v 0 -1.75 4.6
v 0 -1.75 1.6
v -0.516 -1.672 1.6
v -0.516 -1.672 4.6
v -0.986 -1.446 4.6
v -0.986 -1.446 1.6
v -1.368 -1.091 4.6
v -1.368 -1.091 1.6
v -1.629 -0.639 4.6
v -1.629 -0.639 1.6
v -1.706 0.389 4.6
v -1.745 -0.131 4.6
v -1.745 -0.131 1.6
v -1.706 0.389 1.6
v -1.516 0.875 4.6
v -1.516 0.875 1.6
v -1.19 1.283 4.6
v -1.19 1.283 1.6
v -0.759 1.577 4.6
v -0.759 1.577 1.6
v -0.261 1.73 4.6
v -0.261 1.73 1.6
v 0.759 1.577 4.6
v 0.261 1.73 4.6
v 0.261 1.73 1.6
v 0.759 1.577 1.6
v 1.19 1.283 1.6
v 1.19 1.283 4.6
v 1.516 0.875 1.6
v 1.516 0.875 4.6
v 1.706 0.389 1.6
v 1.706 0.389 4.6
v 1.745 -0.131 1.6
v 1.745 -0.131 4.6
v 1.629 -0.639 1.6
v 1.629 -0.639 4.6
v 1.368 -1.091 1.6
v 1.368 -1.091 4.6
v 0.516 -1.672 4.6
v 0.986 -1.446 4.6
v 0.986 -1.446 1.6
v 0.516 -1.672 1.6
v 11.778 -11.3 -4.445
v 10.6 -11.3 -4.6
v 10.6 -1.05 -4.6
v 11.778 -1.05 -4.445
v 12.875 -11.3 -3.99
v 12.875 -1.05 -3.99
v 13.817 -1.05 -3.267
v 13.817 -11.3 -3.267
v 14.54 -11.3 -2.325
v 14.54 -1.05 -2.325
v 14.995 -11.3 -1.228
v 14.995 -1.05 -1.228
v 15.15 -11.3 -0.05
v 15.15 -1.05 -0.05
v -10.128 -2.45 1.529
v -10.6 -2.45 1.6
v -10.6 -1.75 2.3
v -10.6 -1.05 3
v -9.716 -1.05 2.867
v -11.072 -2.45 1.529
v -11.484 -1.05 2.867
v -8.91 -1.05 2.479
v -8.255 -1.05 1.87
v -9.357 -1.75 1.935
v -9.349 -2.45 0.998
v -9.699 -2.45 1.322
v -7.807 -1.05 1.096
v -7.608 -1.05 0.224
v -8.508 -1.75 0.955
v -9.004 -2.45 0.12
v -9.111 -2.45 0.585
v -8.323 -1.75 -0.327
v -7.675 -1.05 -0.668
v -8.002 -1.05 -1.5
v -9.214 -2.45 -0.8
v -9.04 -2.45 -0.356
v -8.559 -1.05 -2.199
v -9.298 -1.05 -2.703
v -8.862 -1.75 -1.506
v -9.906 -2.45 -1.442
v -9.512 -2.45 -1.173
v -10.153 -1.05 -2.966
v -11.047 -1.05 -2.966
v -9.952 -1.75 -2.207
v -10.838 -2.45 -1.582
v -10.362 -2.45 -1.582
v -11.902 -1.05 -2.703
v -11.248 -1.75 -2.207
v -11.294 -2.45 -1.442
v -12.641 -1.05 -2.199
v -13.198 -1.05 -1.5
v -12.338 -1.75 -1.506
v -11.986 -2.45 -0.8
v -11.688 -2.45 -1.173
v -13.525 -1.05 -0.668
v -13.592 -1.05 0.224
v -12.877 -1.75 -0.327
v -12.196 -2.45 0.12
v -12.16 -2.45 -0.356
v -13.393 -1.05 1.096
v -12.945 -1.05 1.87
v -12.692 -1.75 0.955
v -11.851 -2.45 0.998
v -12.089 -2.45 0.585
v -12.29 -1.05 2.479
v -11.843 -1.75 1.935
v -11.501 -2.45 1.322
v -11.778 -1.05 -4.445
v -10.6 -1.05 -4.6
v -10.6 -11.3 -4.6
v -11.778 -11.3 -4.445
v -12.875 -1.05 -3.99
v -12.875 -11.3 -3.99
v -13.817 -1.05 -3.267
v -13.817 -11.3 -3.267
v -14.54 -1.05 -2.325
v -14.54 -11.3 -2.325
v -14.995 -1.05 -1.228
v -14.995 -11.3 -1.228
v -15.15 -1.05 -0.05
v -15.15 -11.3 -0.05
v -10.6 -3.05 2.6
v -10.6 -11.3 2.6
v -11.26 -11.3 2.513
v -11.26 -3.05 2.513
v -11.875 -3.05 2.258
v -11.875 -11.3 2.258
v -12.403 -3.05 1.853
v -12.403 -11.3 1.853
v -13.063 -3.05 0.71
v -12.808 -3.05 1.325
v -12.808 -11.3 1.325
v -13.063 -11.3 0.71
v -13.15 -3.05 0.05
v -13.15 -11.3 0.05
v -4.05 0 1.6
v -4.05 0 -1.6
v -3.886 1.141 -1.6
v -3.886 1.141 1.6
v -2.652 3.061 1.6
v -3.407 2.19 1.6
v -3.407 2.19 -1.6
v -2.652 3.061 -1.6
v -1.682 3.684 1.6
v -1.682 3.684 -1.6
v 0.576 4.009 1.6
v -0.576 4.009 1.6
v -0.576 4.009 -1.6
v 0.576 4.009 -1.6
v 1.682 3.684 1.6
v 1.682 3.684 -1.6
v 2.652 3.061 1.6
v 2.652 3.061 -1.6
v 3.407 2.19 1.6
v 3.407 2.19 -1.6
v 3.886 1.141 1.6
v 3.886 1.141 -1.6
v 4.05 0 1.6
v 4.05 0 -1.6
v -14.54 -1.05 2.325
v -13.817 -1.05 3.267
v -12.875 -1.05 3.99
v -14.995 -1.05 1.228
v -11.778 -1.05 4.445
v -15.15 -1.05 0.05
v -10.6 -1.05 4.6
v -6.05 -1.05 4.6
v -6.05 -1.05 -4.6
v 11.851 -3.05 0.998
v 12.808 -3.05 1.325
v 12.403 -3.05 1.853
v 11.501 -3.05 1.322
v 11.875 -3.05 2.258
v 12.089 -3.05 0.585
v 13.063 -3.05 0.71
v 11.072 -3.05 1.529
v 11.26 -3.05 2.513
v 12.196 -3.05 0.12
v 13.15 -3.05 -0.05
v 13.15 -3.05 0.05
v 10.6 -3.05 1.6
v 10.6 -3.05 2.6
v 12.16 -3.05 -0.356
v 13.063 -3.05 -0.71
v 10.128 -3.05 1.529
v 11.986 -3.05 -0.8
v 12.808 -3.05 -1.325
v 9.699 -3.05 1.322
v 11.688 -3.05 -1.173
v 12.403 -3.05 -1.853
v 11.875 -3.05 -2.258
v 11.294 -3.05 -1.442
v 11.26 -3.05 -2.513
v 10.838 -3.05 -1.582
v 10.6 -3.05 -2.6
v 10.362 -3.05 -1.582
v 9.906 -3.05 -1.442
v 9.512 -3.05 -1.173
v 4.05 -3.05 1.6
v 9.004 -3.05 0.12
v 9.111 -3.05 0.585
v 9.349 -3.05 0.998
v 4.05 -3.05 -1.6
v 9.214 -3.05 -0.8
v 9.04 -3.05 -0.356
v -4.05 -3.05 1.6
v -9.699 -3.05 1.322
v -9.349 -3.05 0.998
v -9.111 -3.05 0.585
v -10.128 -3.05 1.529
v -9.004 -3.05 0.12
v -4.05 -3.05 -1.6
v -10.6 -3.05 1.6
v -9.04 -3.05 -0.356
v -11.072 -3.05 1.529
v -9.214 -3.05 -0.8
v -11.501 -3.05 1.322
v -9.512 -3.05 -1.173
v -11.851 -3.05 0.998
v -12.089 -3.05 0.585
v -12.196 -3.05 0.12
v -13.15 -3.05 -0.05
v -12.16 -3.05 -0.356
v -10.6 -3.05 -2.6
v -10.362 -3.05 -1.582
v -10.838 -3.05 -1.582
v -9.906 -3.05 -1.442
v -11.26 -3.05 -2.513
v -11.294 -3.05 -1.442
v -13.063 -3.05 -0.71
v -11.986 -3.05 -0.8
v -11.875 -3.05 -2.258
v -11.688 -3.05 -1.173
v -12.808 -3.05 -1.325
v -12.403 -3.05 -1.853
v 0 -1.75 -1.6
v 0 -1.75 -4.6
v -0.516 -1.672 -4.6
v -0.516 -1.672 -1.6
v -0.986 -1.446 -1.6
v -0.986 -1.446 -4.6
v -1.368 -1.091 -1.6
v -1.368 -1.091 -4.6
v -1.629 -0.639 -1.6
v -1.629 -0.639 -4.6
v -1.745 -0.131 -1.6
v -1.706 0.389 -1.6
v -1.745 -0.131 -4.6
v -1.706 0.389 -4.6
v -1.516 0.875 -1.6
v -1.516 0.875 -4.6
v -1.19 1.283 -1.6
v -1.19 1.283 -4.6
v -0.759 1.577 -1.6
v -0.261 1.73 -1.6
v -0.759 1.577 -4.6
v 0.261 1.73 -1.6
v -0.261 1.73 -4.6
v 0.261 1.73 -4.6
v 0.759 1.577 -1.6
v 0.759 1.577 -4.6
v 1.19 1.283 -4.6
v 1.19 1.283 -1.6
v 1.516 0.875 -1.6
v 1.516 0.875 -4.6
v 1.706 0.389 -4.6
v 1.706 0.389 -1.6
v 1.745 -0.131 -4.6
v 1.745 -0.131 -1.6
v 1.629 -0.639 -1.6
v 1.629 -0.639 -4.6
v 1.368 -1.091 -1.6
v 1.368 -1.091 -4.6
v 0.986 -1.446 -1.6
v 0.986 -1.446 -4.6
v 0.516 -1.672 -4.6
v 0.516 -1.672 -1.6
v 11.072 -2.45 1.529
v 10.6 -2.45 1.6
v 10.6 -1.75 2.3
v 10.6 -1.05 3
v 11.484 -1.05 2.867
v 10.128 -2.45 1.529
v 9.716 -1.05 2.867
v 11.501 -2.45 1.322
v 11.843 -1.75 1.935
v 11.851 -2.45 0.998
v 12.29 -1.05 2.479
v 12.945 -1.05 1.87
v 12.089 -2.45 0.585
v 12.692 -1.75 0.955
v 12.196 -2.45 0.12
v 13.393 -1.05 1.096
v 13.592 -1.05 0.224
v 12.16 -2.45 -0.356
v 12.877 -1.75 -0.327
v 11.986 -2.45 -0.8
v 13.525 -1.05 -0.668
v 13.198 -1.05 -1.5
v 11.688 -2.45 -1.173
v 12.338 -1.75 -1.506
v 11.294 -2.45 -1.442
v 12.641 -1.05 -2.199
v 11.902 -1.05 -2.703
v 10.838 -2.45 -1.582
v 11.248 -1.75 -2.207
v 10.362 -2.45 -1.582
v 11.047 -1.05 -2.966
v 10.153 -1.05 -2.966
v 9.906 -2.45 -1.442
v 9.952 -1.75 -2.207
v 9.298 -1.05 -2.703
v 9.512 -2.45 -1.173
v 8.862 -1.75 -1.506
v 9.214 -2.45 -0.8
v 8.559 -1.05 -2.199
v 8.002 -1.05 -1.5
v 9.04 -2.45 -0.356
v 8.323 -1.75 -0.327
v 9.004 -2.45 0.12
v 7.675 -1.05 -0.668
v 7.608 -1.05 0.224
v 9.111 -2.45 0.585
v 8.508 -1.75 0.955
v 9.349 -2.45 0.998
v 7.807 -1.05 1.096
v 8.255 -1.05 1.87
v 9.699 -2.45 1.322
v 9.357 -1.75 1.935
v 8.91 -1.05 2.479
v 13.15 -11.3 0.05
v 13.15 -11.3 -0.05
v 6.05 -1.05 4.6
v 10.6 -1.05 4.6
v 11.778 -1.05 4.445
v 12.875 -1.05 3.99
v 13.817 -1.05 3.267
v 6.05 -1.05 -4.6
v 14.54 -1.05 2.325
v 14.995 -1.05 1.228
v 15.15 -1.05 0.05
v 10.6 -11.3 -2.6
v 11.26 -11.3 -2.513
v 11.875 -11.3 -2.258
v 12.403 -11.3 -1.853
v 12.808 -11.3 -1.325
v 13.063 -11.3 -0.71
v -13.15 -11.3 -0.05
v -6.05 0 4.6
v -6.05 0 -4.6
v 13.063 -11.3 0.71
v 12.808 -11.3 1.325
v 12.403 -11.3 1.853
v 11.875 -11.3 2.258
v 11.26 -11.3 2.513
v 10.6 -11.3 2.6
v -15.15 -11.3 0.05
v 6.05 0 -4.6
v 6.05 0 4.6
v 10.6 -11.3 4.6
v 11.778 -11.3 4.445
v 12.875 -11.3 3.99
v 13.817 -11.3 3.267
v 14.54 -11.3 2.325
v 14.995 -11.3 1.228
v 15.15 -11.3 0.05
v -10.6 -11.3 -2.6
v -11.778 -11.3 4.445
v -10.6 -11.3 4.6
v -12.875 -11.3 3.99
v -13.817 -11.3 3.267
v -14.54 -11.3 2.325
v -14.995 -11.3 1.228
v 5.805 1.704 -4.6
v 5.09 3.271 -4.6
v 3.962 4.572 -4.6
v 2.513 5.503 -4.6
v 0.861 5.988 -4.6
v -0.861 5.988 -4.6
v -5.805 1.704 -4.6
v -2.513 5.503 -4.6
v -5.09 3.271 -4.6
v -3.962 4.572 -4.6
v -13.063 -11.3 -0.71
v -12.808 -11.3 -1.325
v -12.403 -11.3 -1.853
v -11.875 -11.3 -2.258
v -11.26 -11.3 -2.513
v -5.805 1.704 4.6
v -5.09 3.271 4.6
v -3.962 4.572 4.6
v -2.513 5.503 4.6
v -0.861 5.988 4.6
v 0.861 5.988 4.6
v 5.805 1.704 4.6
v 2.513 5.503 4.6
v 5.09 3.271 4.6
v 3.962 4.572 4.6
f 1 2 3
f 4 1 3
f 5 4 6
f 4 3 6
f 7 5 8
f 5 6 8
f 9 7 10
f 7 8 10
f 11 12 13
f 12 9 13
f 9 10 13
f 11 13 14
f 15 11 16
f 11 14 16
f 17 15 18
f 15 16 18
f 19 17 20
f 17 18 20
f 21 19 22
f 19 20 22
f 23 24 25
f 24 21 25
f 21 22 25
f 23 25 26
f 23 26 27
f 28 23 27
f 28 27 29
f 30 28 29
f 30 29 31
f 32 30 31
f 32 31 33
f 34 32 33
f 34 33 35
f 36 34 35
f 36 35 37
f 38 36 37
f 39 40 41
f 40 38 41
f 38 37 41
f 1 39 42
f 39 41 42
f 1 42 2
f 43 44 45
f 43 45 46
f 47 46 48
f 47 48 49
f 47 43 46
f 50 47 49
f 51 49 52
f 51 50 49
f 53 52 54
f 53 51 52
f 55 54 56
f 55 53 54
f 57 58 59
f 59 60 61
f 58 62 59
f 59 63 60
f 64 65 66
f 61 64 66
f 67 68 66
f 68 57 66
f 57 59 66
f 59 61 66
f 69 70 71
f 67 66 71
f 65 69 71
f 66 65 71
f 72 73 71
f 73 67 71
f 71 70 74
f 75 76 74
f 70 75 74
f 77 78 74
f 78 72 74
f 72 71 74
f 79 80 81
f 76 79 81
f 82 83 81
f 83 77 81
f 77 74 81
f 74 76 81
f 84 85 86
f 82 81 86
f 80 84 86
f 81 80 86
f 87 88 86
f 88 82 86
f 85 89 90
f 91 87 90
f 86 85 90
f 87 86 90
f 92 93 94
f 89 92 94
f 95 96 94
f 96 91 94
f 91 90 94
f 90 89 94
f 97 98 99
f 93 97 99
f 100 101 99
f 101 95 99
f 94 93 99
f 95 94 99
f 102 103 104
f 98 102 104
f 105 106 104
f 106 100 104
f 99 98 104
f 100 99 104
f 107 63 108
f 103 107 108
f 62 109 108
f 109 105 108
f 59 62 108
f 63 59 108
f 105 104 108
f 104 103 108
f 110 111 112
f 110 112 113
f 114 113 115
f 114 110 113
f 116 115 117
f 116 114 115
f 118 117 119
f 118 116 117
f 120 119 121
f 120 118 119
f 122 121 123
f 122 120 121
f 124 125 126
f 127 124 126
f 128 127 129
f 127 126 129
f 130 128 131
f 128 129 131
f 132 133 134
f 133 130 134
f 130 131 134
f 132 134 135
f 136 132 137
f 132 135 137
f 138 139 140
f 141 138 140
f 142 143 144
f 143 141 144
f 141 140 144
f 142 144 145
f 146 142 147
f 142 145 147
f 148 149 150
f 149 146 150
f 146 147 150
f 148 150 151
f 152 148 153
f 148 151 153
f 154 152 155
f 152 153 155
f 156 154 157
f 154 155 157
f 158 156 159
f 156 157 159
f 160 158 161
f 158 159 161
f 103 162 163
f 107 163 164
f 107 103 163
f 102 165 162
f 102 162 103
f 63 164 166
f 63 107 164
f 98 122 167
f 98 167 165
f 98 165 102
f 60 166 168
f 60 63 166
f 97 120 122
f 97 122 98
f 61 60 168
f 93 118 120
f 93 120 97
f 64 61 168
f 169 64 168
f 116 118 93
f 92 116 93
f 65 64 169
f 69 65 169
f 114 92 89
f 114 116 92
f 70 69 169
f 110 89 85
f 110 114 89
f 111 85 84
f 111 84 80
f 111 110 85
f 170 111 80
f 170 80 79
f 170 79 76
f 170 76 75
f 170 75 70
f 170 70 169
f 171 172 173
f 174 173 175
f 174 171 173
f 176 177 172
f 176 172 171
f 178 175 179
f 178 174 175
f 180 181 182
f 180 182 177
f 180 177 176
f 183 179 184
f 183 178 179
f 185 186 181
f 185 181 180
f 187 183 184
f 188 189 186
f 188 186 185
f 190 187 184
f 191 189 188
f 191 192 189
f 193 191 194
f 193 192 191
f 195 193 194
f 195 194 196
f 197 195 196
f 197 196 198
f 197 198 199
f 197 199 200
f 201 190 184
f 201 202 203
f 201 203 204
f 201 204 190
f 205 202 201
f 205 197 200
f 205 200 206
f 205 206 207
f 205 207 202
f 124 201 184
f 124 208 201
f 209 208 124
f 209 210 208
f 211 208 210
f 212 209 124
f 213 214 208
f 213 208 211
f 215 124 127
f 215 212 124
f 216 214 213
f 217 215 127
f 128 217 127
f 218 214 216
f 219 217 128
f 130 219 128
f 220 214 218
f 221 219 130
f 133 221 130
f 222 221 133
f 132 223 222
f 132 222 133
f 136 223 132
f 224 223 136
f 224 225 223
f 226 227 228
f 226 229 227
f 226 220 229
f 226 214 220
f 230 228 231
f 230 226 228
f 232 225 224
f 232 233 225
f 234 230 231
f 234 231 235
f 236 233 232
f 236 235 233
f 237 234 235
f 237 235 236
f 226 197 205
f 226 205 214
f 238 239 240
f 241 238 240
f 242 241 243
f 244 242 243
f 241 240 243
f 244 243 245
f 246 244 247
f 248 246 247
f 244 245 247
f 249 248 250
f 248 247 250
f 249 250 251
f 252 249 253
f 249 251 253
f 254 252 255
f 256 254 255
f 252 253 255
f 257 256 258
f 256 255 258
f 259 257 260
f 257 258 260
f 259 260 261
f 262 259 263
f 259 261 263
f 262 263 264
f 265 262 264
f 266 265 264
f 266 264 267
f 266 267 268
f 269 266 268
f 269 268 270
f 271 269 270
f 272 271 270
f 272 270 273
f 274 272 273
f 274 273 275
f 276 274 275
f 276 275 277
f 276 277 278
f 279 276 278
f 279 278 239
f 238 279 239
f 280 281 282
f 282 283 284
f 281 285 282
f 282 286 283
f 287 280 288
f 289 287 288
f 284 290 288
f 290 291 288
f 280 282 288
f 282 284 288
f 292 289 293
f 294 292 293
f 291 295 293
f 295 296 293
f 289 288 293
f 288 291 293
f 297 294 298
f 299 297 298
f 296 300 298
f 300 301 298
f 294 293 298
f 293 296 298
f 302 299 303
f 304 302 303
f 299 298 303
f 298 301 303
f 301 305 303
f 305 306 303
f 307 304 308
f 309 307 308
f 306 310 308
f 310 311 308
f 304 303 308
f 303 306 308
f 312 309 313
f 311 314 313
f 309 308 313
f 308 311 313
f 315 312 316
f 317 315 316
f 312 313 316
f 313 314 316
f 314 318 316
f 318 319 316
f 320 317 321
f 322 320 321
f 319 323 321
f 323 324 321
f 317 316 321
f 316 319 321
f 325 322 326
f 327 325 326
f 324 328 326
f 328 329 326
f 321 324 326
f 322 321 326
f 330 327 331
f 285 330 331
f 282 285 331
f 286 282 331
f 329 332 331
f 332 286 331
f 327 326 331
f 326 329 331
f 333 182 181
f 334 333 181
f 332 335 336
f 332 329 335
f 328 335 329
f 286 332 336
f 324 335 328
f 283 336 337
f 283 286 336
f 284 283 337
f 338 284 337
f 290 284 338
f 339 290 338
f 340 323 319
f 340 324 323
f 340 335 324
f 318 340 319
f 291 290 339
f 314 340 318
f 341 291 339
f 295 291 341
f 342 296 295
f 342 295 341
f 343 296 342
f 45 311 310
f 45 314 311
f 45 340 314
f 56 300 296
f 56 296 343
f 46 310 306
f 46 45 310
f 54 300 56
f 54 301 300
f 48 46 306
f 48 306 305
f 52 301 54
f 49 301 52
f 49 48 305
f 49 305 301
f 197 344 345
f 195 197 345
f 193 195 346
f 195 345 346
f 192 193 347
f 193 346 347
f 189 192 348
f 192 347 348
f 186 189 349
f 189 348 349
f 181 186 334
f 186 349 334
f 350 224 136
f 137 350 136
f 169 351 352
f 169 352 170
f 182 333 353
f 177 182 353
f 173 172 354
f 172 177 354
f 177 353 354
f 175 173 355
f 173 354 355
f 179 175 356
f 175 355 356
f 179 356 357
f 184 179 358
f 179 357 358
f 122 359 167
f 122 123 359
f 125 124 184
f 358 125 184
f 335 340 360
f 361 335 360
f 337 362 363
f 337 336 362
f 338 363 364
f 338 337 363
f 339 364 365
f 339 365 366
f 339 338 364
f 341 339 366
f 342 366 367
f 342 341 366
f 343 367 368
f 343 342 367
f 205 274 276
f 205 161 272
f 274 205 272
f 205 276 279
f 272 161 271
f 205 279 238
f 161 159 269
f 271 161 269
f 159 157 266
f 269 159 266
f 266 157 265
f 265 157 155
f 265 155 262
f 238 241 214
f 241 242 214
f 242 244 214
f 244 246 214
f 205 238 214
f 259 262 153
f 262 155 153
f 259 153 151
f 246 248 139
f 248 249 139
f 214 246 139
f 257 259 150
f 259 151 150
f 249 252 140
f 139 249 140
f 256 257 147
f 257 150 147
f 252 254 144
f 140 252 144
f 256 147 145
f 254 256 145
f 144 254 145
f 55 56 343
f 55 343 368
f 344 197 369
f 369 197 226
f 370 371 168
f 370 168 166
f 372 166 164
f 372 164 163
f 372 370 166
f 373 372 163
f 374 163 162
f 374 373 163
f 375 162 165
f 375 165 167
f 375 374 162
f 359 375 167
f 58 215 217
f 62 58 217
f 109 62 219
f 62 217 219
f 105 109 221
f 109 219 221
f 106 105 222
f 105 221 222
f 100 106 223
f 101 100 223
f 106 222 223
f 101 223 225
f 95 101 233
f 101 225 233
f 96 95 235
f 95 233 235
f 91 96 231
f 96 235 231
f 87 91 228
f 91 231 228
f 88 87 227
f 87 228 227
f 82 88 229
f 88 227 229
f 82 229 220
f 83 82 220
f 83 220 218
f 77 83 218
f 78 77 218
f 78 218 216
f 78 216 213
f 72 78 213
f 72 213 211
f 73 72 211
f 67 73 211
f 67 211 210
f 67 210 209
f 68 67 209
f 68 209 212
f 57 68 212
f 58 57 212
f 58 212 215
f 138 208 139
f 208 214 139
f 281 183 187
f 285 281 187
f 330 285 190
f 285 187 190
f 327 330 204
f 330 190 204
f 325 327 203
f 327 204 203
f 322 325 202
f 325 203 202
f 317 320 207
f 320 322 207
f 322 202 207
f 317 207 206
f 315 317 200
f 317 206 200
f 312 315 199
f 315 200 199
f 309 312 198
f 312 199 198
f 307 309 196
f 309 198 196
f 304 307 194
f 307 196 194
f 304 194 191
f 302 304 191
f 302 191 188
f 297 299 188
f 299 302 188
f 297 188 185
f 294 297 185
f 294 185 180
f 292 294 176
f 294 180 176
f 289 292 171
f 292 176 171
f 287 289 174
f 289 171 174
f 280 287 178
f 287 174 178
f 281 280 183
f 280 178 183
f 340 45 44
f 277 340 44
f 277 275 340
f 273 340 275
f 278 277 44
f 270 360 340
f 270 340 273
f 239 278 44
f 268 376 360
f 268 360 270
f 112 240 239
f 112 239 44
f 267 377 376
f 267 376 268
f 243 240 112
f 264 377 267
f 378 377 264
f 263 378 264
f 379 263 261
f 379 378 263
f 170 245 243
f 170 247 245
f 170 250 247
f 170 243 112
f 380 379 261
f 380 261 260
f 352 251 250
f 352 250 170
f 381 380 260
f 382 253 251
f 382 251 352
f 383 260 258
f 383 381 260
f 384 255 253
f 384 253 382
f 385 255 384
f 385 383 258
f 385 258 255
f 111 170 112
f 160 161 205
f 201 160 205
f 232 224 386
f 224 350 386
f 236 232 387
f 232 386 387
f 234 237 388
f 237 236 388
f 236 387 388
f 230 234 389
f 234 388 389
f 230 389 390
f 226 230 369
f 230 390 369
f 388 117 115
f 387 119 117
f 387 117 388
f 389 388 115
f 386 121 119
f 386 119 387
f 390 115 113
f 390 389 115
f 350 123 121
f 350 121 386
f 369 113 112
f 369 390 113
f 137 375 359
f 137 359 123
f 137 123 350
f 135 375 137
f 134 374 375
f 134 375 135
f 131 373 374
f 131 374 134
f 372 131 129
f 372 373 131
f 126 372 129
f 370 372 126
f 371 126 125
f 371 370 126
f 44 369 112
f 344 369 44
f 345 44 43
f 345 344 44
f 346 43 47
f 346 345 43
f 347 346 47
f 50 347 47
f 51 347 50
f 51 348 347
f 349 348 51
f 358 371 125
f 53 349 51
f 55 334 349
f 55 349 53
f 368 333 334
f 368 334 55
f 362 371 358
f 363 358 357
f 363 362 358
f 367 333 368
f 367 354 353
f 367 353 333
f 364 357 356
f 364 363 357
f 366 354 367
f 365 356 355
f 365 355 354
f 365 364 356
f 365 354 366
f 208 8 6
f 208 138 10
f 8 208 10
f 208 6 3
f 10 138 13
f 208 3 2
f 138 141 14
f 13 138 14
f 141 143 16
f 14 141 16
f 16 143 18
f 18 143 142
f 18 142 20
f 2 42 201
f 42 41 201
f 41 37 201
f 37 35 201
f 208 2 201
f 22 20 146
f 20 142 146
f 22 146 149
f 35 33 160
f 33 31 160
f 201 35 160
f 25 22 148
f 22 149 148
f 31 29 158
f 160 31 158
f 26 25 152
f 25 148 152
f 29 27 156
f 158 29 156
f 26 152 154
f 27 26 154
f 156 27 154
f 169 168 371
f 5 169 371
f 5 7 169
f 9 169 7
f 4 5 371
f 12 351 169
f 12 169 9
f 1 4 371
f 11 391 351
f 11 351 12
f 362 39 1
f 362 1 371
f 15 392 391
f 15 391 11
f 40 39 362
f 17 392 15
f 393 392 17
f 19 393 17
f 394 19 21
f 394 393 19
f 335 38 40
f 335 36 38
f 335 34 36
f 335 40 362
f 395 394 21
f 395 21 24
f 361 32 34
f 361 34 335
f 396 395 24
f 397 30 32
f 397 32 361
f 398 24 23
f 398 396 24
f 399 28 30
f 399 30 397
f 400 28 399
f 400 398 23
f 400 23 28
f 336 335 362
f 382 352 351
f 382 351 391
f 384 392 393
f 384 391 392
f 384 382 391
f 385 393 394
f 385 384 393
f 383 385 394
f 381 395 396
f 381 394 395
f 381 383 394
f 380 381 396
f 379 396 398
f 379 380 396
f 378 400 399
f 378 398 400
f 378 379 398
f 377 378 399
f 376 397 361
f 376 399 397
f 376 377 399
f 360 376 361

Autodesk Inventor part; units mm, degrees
ref_plane "YZ Plane" through (0, 0, 0) normal (1, 0, 0) x (0, 1, 0)
ref_plane "XZ Plane" through (0, 0, 0) normal (0, 1, 0) x (-1, 0, 0)
ref_plane "XY Plane" through (0, 0, 0) normal (0, 0, 1) x (1, 0, 0)
sketch "Эскиз1" plane through (0, 0, 0) normal (0, 0, 1) x (1, 0, 0)
  circle A0 centre (0, 0) radius 4.05
  line L0 (-6.05, -6.05) -> (6.05, -6.05)
  line L1 (6.05, -6.05) -> (6.05, 6.05)
  line L2 (6.05, 6.05) -> (-6.05, 6.05)
  line L3 (-6.05, 6.05) -> (-6.05, -6.05)
  line L4 (-6.05, -6.05) -> (6.05, 6.05) construction
  line L5 (6.05, -6.05) -> (-6.05, 6.05) construction
  line L6 (0, 4.05) -> (0, 6.05)
  line L7 (-4.05, 0) -> (-6.05, 0)
  line L8 (-15.15, -1.05) -> (0, -1.05)
  line L9 (0, -1.05) -> (0, -3.05)
  line L10 (0, -3.05) -> (-15.15, -3.05)
  line L11 (-15.15, -3.05) -> (-15.15, -1.05)
  line L12 (-4.05, 0) -> (4.05, 0)
  line L13 (4.05, 0) -> (4.05, -3.05)
  line L14 (4.05, -3.05) -> (-4.05, -3.05)
  line L15 (-4.05, -3.05) -> (-4.05, 0)
  line L16 (4.05, -3.05) -> (6.05, -3.05)
  line L17 (6.05, -3.05) -> (6.05, 0)
  line L18 (6.05, 0) -> (4.05, 0)
  line L19 (4.05, 0) -> (4.05, -3.05)
  point P0 (0, -2.05)
  point P1 (0, -6.05)
  point P2 (-6.05, -1.05)
  point P3 (-2.6646, -3.05)
  point P4 (-4.05, -3.05)
  point P5 (2.6646, -3.05)
  point P6 (-6.05, -3.05)
  point P7 (-4.05, -1.05)
  point P8 (-3.9115, -1.05)
  point P9 (-2.6646, -3.05)
  dimension "d0" = 8.1
  dimension "d1" = 2
  dimension "d2" = 2
  dimension "d3" = 9.1
  dimension "d4" = 2
  dimension "d5" = 3
extrude "Выдавливание1" add sketch "Эскиз1" along normal blind 1.6 contours A0 L7 L3 L2 L6 | L15 L8 L3 L7 | L15 L10 L3 L8 | L3 L10 L11 L8
sketch "Эскиз2" plane through (0, 0, 1.6) normal (0, 0, 1) x (1, 0, 0)
  line L0 (-6.05, -1.05) -> (-15.15, -1.05) projected
  line L1 (-15.15, -1.05) -> (-15.15, -3.05) projected
  line L2 (-15.15, -3.05) -> (-4.05, -3.05) projected
  line L3 (-4.05, -3.05) -> (-4.05, 0) projected
  arc A0 (0, 4.05) -> (-4.05, 0) centre (0, 0) ccw projected
  line L4 (0, 4.05) -> (0, 6.05) projected
  line L5 (0, 6.05) -> (-6.05, 6.05) projected
  line L6 (-6.05, 6.05) -> (-6.05, -1.05) projected
  line L7 (0, 4.05) -> (-4.05, 4.05)
  line L8 (-4.05, 4.05) -> (-4.05, -3.05)
  line L9 (-4.05, -3.05) -> (0, -3.05)
  line L10 (0, -3.05) -> (0, 4.05)
extrude "Выдавливание2" add sketch "Эскиз2" along normal blind 3
mirror "Зеркальное отражение1" about plane through (-9.6, -2.05, 0) normal (0, 0, -1)
sketch "Эскиз4" plane through (-15.15, -1.05, 4.6) normal (0, 1, 0) x (1, 0, 0)
  line L0 (0, 0) -> (0, 9.2) projected
  line L1 (0, 4.6) -> (9.1, 4.6)
  line L2 (9.1, 9.2) -> (9.1, 0) projected
  point P0 (15.15, 4.6)
  point P1 (4.55, 4.6)
hole "Отверстие2" at (-10.6, -1.05, 0) direction (0, -1, 0) diameter 3.2 end through all countersink diameter 6 countersink angle 90
mirror "Зеркальное отражение2" about plane through (0, 4.05, 0) normal (1, 0, 0)
sketch "Эскиз3" plane through (0, 0, 4.6) normal (0, 0, 1) x (1, 0, 0)
  arc A0 (2.6646, -3.05) -> (4.05, 0) centre (0, 0) ccw projected
  arc A1 (2.6646, -3.05) -> (4.05, 0) centre (0, 0) ccw projected
hole "Отверстие1" at (0, 0, 4.6) direction (0, 0, -1) diameter 3.5 end through all
fillet "Сопряжение1" radius 6.05 2 edges at (-6.05, 6.05, 0) (6.05, 6.05, 0)
sketch "Эскиз7" plane through (-15.15, -3.05, -4.6) normal (0, -1, 0) x (1, 0, 0)
  line L0 (30.3, 0) -> (0, 0) projected
  line L1 (0, 9.2) -> (30.3, 9.2) projected
  line L2 (13.4, 9.2) -> (16.9, 9.2) projected
  line L3 (15.15, 9.2) -> (15.15, 0)
  line L4 (28.3, 2) -> (2, 2)
  line L5 (2, 2) -> (2, 7.2)
  line L6 (2, 7.2) -> (28.3, 7.2)
  line L7 (28.3, 7.2) -> (28.3, 2)
  line L8 (28.3, 2) -> (2, 7.2) construction
  line L9 (2, 2) -> (28.3, 7.2) construction
  line L10 (0, 0) -> (0, 9.2) projected
  line L11 (30.3, 0) -> (30.3, 9.2) projected
  point P0 (15.15, 4.6)
  dimension "d29" = 2
  dimension "d30" = 2
extrude "Выдавливание4" add sketch "Эскиз7" along normal blind 8.25 contours L0 L3 L4 L7 L6 L1 L11 | L0 L10 L1 L3 L6 L5 L4
fillet "Сопряжение2" radius 4.55 4 edges at (15.15, -6.175, -4.6) (15.15, -6.175, 4.6) (-15.15, -6.175, -4.6) (-15.15, -6.175, 4.6)
fillet "Сопряжение3" radius 2.55 4 edges at (13.15, -7.175, -2.6) (13.15, -7.175, 2.6) (-13.15, -7.175, 2.6) (-13.15, -7.175, -2.6)
properties part number "Крышка стойки подшипника 3мм"
